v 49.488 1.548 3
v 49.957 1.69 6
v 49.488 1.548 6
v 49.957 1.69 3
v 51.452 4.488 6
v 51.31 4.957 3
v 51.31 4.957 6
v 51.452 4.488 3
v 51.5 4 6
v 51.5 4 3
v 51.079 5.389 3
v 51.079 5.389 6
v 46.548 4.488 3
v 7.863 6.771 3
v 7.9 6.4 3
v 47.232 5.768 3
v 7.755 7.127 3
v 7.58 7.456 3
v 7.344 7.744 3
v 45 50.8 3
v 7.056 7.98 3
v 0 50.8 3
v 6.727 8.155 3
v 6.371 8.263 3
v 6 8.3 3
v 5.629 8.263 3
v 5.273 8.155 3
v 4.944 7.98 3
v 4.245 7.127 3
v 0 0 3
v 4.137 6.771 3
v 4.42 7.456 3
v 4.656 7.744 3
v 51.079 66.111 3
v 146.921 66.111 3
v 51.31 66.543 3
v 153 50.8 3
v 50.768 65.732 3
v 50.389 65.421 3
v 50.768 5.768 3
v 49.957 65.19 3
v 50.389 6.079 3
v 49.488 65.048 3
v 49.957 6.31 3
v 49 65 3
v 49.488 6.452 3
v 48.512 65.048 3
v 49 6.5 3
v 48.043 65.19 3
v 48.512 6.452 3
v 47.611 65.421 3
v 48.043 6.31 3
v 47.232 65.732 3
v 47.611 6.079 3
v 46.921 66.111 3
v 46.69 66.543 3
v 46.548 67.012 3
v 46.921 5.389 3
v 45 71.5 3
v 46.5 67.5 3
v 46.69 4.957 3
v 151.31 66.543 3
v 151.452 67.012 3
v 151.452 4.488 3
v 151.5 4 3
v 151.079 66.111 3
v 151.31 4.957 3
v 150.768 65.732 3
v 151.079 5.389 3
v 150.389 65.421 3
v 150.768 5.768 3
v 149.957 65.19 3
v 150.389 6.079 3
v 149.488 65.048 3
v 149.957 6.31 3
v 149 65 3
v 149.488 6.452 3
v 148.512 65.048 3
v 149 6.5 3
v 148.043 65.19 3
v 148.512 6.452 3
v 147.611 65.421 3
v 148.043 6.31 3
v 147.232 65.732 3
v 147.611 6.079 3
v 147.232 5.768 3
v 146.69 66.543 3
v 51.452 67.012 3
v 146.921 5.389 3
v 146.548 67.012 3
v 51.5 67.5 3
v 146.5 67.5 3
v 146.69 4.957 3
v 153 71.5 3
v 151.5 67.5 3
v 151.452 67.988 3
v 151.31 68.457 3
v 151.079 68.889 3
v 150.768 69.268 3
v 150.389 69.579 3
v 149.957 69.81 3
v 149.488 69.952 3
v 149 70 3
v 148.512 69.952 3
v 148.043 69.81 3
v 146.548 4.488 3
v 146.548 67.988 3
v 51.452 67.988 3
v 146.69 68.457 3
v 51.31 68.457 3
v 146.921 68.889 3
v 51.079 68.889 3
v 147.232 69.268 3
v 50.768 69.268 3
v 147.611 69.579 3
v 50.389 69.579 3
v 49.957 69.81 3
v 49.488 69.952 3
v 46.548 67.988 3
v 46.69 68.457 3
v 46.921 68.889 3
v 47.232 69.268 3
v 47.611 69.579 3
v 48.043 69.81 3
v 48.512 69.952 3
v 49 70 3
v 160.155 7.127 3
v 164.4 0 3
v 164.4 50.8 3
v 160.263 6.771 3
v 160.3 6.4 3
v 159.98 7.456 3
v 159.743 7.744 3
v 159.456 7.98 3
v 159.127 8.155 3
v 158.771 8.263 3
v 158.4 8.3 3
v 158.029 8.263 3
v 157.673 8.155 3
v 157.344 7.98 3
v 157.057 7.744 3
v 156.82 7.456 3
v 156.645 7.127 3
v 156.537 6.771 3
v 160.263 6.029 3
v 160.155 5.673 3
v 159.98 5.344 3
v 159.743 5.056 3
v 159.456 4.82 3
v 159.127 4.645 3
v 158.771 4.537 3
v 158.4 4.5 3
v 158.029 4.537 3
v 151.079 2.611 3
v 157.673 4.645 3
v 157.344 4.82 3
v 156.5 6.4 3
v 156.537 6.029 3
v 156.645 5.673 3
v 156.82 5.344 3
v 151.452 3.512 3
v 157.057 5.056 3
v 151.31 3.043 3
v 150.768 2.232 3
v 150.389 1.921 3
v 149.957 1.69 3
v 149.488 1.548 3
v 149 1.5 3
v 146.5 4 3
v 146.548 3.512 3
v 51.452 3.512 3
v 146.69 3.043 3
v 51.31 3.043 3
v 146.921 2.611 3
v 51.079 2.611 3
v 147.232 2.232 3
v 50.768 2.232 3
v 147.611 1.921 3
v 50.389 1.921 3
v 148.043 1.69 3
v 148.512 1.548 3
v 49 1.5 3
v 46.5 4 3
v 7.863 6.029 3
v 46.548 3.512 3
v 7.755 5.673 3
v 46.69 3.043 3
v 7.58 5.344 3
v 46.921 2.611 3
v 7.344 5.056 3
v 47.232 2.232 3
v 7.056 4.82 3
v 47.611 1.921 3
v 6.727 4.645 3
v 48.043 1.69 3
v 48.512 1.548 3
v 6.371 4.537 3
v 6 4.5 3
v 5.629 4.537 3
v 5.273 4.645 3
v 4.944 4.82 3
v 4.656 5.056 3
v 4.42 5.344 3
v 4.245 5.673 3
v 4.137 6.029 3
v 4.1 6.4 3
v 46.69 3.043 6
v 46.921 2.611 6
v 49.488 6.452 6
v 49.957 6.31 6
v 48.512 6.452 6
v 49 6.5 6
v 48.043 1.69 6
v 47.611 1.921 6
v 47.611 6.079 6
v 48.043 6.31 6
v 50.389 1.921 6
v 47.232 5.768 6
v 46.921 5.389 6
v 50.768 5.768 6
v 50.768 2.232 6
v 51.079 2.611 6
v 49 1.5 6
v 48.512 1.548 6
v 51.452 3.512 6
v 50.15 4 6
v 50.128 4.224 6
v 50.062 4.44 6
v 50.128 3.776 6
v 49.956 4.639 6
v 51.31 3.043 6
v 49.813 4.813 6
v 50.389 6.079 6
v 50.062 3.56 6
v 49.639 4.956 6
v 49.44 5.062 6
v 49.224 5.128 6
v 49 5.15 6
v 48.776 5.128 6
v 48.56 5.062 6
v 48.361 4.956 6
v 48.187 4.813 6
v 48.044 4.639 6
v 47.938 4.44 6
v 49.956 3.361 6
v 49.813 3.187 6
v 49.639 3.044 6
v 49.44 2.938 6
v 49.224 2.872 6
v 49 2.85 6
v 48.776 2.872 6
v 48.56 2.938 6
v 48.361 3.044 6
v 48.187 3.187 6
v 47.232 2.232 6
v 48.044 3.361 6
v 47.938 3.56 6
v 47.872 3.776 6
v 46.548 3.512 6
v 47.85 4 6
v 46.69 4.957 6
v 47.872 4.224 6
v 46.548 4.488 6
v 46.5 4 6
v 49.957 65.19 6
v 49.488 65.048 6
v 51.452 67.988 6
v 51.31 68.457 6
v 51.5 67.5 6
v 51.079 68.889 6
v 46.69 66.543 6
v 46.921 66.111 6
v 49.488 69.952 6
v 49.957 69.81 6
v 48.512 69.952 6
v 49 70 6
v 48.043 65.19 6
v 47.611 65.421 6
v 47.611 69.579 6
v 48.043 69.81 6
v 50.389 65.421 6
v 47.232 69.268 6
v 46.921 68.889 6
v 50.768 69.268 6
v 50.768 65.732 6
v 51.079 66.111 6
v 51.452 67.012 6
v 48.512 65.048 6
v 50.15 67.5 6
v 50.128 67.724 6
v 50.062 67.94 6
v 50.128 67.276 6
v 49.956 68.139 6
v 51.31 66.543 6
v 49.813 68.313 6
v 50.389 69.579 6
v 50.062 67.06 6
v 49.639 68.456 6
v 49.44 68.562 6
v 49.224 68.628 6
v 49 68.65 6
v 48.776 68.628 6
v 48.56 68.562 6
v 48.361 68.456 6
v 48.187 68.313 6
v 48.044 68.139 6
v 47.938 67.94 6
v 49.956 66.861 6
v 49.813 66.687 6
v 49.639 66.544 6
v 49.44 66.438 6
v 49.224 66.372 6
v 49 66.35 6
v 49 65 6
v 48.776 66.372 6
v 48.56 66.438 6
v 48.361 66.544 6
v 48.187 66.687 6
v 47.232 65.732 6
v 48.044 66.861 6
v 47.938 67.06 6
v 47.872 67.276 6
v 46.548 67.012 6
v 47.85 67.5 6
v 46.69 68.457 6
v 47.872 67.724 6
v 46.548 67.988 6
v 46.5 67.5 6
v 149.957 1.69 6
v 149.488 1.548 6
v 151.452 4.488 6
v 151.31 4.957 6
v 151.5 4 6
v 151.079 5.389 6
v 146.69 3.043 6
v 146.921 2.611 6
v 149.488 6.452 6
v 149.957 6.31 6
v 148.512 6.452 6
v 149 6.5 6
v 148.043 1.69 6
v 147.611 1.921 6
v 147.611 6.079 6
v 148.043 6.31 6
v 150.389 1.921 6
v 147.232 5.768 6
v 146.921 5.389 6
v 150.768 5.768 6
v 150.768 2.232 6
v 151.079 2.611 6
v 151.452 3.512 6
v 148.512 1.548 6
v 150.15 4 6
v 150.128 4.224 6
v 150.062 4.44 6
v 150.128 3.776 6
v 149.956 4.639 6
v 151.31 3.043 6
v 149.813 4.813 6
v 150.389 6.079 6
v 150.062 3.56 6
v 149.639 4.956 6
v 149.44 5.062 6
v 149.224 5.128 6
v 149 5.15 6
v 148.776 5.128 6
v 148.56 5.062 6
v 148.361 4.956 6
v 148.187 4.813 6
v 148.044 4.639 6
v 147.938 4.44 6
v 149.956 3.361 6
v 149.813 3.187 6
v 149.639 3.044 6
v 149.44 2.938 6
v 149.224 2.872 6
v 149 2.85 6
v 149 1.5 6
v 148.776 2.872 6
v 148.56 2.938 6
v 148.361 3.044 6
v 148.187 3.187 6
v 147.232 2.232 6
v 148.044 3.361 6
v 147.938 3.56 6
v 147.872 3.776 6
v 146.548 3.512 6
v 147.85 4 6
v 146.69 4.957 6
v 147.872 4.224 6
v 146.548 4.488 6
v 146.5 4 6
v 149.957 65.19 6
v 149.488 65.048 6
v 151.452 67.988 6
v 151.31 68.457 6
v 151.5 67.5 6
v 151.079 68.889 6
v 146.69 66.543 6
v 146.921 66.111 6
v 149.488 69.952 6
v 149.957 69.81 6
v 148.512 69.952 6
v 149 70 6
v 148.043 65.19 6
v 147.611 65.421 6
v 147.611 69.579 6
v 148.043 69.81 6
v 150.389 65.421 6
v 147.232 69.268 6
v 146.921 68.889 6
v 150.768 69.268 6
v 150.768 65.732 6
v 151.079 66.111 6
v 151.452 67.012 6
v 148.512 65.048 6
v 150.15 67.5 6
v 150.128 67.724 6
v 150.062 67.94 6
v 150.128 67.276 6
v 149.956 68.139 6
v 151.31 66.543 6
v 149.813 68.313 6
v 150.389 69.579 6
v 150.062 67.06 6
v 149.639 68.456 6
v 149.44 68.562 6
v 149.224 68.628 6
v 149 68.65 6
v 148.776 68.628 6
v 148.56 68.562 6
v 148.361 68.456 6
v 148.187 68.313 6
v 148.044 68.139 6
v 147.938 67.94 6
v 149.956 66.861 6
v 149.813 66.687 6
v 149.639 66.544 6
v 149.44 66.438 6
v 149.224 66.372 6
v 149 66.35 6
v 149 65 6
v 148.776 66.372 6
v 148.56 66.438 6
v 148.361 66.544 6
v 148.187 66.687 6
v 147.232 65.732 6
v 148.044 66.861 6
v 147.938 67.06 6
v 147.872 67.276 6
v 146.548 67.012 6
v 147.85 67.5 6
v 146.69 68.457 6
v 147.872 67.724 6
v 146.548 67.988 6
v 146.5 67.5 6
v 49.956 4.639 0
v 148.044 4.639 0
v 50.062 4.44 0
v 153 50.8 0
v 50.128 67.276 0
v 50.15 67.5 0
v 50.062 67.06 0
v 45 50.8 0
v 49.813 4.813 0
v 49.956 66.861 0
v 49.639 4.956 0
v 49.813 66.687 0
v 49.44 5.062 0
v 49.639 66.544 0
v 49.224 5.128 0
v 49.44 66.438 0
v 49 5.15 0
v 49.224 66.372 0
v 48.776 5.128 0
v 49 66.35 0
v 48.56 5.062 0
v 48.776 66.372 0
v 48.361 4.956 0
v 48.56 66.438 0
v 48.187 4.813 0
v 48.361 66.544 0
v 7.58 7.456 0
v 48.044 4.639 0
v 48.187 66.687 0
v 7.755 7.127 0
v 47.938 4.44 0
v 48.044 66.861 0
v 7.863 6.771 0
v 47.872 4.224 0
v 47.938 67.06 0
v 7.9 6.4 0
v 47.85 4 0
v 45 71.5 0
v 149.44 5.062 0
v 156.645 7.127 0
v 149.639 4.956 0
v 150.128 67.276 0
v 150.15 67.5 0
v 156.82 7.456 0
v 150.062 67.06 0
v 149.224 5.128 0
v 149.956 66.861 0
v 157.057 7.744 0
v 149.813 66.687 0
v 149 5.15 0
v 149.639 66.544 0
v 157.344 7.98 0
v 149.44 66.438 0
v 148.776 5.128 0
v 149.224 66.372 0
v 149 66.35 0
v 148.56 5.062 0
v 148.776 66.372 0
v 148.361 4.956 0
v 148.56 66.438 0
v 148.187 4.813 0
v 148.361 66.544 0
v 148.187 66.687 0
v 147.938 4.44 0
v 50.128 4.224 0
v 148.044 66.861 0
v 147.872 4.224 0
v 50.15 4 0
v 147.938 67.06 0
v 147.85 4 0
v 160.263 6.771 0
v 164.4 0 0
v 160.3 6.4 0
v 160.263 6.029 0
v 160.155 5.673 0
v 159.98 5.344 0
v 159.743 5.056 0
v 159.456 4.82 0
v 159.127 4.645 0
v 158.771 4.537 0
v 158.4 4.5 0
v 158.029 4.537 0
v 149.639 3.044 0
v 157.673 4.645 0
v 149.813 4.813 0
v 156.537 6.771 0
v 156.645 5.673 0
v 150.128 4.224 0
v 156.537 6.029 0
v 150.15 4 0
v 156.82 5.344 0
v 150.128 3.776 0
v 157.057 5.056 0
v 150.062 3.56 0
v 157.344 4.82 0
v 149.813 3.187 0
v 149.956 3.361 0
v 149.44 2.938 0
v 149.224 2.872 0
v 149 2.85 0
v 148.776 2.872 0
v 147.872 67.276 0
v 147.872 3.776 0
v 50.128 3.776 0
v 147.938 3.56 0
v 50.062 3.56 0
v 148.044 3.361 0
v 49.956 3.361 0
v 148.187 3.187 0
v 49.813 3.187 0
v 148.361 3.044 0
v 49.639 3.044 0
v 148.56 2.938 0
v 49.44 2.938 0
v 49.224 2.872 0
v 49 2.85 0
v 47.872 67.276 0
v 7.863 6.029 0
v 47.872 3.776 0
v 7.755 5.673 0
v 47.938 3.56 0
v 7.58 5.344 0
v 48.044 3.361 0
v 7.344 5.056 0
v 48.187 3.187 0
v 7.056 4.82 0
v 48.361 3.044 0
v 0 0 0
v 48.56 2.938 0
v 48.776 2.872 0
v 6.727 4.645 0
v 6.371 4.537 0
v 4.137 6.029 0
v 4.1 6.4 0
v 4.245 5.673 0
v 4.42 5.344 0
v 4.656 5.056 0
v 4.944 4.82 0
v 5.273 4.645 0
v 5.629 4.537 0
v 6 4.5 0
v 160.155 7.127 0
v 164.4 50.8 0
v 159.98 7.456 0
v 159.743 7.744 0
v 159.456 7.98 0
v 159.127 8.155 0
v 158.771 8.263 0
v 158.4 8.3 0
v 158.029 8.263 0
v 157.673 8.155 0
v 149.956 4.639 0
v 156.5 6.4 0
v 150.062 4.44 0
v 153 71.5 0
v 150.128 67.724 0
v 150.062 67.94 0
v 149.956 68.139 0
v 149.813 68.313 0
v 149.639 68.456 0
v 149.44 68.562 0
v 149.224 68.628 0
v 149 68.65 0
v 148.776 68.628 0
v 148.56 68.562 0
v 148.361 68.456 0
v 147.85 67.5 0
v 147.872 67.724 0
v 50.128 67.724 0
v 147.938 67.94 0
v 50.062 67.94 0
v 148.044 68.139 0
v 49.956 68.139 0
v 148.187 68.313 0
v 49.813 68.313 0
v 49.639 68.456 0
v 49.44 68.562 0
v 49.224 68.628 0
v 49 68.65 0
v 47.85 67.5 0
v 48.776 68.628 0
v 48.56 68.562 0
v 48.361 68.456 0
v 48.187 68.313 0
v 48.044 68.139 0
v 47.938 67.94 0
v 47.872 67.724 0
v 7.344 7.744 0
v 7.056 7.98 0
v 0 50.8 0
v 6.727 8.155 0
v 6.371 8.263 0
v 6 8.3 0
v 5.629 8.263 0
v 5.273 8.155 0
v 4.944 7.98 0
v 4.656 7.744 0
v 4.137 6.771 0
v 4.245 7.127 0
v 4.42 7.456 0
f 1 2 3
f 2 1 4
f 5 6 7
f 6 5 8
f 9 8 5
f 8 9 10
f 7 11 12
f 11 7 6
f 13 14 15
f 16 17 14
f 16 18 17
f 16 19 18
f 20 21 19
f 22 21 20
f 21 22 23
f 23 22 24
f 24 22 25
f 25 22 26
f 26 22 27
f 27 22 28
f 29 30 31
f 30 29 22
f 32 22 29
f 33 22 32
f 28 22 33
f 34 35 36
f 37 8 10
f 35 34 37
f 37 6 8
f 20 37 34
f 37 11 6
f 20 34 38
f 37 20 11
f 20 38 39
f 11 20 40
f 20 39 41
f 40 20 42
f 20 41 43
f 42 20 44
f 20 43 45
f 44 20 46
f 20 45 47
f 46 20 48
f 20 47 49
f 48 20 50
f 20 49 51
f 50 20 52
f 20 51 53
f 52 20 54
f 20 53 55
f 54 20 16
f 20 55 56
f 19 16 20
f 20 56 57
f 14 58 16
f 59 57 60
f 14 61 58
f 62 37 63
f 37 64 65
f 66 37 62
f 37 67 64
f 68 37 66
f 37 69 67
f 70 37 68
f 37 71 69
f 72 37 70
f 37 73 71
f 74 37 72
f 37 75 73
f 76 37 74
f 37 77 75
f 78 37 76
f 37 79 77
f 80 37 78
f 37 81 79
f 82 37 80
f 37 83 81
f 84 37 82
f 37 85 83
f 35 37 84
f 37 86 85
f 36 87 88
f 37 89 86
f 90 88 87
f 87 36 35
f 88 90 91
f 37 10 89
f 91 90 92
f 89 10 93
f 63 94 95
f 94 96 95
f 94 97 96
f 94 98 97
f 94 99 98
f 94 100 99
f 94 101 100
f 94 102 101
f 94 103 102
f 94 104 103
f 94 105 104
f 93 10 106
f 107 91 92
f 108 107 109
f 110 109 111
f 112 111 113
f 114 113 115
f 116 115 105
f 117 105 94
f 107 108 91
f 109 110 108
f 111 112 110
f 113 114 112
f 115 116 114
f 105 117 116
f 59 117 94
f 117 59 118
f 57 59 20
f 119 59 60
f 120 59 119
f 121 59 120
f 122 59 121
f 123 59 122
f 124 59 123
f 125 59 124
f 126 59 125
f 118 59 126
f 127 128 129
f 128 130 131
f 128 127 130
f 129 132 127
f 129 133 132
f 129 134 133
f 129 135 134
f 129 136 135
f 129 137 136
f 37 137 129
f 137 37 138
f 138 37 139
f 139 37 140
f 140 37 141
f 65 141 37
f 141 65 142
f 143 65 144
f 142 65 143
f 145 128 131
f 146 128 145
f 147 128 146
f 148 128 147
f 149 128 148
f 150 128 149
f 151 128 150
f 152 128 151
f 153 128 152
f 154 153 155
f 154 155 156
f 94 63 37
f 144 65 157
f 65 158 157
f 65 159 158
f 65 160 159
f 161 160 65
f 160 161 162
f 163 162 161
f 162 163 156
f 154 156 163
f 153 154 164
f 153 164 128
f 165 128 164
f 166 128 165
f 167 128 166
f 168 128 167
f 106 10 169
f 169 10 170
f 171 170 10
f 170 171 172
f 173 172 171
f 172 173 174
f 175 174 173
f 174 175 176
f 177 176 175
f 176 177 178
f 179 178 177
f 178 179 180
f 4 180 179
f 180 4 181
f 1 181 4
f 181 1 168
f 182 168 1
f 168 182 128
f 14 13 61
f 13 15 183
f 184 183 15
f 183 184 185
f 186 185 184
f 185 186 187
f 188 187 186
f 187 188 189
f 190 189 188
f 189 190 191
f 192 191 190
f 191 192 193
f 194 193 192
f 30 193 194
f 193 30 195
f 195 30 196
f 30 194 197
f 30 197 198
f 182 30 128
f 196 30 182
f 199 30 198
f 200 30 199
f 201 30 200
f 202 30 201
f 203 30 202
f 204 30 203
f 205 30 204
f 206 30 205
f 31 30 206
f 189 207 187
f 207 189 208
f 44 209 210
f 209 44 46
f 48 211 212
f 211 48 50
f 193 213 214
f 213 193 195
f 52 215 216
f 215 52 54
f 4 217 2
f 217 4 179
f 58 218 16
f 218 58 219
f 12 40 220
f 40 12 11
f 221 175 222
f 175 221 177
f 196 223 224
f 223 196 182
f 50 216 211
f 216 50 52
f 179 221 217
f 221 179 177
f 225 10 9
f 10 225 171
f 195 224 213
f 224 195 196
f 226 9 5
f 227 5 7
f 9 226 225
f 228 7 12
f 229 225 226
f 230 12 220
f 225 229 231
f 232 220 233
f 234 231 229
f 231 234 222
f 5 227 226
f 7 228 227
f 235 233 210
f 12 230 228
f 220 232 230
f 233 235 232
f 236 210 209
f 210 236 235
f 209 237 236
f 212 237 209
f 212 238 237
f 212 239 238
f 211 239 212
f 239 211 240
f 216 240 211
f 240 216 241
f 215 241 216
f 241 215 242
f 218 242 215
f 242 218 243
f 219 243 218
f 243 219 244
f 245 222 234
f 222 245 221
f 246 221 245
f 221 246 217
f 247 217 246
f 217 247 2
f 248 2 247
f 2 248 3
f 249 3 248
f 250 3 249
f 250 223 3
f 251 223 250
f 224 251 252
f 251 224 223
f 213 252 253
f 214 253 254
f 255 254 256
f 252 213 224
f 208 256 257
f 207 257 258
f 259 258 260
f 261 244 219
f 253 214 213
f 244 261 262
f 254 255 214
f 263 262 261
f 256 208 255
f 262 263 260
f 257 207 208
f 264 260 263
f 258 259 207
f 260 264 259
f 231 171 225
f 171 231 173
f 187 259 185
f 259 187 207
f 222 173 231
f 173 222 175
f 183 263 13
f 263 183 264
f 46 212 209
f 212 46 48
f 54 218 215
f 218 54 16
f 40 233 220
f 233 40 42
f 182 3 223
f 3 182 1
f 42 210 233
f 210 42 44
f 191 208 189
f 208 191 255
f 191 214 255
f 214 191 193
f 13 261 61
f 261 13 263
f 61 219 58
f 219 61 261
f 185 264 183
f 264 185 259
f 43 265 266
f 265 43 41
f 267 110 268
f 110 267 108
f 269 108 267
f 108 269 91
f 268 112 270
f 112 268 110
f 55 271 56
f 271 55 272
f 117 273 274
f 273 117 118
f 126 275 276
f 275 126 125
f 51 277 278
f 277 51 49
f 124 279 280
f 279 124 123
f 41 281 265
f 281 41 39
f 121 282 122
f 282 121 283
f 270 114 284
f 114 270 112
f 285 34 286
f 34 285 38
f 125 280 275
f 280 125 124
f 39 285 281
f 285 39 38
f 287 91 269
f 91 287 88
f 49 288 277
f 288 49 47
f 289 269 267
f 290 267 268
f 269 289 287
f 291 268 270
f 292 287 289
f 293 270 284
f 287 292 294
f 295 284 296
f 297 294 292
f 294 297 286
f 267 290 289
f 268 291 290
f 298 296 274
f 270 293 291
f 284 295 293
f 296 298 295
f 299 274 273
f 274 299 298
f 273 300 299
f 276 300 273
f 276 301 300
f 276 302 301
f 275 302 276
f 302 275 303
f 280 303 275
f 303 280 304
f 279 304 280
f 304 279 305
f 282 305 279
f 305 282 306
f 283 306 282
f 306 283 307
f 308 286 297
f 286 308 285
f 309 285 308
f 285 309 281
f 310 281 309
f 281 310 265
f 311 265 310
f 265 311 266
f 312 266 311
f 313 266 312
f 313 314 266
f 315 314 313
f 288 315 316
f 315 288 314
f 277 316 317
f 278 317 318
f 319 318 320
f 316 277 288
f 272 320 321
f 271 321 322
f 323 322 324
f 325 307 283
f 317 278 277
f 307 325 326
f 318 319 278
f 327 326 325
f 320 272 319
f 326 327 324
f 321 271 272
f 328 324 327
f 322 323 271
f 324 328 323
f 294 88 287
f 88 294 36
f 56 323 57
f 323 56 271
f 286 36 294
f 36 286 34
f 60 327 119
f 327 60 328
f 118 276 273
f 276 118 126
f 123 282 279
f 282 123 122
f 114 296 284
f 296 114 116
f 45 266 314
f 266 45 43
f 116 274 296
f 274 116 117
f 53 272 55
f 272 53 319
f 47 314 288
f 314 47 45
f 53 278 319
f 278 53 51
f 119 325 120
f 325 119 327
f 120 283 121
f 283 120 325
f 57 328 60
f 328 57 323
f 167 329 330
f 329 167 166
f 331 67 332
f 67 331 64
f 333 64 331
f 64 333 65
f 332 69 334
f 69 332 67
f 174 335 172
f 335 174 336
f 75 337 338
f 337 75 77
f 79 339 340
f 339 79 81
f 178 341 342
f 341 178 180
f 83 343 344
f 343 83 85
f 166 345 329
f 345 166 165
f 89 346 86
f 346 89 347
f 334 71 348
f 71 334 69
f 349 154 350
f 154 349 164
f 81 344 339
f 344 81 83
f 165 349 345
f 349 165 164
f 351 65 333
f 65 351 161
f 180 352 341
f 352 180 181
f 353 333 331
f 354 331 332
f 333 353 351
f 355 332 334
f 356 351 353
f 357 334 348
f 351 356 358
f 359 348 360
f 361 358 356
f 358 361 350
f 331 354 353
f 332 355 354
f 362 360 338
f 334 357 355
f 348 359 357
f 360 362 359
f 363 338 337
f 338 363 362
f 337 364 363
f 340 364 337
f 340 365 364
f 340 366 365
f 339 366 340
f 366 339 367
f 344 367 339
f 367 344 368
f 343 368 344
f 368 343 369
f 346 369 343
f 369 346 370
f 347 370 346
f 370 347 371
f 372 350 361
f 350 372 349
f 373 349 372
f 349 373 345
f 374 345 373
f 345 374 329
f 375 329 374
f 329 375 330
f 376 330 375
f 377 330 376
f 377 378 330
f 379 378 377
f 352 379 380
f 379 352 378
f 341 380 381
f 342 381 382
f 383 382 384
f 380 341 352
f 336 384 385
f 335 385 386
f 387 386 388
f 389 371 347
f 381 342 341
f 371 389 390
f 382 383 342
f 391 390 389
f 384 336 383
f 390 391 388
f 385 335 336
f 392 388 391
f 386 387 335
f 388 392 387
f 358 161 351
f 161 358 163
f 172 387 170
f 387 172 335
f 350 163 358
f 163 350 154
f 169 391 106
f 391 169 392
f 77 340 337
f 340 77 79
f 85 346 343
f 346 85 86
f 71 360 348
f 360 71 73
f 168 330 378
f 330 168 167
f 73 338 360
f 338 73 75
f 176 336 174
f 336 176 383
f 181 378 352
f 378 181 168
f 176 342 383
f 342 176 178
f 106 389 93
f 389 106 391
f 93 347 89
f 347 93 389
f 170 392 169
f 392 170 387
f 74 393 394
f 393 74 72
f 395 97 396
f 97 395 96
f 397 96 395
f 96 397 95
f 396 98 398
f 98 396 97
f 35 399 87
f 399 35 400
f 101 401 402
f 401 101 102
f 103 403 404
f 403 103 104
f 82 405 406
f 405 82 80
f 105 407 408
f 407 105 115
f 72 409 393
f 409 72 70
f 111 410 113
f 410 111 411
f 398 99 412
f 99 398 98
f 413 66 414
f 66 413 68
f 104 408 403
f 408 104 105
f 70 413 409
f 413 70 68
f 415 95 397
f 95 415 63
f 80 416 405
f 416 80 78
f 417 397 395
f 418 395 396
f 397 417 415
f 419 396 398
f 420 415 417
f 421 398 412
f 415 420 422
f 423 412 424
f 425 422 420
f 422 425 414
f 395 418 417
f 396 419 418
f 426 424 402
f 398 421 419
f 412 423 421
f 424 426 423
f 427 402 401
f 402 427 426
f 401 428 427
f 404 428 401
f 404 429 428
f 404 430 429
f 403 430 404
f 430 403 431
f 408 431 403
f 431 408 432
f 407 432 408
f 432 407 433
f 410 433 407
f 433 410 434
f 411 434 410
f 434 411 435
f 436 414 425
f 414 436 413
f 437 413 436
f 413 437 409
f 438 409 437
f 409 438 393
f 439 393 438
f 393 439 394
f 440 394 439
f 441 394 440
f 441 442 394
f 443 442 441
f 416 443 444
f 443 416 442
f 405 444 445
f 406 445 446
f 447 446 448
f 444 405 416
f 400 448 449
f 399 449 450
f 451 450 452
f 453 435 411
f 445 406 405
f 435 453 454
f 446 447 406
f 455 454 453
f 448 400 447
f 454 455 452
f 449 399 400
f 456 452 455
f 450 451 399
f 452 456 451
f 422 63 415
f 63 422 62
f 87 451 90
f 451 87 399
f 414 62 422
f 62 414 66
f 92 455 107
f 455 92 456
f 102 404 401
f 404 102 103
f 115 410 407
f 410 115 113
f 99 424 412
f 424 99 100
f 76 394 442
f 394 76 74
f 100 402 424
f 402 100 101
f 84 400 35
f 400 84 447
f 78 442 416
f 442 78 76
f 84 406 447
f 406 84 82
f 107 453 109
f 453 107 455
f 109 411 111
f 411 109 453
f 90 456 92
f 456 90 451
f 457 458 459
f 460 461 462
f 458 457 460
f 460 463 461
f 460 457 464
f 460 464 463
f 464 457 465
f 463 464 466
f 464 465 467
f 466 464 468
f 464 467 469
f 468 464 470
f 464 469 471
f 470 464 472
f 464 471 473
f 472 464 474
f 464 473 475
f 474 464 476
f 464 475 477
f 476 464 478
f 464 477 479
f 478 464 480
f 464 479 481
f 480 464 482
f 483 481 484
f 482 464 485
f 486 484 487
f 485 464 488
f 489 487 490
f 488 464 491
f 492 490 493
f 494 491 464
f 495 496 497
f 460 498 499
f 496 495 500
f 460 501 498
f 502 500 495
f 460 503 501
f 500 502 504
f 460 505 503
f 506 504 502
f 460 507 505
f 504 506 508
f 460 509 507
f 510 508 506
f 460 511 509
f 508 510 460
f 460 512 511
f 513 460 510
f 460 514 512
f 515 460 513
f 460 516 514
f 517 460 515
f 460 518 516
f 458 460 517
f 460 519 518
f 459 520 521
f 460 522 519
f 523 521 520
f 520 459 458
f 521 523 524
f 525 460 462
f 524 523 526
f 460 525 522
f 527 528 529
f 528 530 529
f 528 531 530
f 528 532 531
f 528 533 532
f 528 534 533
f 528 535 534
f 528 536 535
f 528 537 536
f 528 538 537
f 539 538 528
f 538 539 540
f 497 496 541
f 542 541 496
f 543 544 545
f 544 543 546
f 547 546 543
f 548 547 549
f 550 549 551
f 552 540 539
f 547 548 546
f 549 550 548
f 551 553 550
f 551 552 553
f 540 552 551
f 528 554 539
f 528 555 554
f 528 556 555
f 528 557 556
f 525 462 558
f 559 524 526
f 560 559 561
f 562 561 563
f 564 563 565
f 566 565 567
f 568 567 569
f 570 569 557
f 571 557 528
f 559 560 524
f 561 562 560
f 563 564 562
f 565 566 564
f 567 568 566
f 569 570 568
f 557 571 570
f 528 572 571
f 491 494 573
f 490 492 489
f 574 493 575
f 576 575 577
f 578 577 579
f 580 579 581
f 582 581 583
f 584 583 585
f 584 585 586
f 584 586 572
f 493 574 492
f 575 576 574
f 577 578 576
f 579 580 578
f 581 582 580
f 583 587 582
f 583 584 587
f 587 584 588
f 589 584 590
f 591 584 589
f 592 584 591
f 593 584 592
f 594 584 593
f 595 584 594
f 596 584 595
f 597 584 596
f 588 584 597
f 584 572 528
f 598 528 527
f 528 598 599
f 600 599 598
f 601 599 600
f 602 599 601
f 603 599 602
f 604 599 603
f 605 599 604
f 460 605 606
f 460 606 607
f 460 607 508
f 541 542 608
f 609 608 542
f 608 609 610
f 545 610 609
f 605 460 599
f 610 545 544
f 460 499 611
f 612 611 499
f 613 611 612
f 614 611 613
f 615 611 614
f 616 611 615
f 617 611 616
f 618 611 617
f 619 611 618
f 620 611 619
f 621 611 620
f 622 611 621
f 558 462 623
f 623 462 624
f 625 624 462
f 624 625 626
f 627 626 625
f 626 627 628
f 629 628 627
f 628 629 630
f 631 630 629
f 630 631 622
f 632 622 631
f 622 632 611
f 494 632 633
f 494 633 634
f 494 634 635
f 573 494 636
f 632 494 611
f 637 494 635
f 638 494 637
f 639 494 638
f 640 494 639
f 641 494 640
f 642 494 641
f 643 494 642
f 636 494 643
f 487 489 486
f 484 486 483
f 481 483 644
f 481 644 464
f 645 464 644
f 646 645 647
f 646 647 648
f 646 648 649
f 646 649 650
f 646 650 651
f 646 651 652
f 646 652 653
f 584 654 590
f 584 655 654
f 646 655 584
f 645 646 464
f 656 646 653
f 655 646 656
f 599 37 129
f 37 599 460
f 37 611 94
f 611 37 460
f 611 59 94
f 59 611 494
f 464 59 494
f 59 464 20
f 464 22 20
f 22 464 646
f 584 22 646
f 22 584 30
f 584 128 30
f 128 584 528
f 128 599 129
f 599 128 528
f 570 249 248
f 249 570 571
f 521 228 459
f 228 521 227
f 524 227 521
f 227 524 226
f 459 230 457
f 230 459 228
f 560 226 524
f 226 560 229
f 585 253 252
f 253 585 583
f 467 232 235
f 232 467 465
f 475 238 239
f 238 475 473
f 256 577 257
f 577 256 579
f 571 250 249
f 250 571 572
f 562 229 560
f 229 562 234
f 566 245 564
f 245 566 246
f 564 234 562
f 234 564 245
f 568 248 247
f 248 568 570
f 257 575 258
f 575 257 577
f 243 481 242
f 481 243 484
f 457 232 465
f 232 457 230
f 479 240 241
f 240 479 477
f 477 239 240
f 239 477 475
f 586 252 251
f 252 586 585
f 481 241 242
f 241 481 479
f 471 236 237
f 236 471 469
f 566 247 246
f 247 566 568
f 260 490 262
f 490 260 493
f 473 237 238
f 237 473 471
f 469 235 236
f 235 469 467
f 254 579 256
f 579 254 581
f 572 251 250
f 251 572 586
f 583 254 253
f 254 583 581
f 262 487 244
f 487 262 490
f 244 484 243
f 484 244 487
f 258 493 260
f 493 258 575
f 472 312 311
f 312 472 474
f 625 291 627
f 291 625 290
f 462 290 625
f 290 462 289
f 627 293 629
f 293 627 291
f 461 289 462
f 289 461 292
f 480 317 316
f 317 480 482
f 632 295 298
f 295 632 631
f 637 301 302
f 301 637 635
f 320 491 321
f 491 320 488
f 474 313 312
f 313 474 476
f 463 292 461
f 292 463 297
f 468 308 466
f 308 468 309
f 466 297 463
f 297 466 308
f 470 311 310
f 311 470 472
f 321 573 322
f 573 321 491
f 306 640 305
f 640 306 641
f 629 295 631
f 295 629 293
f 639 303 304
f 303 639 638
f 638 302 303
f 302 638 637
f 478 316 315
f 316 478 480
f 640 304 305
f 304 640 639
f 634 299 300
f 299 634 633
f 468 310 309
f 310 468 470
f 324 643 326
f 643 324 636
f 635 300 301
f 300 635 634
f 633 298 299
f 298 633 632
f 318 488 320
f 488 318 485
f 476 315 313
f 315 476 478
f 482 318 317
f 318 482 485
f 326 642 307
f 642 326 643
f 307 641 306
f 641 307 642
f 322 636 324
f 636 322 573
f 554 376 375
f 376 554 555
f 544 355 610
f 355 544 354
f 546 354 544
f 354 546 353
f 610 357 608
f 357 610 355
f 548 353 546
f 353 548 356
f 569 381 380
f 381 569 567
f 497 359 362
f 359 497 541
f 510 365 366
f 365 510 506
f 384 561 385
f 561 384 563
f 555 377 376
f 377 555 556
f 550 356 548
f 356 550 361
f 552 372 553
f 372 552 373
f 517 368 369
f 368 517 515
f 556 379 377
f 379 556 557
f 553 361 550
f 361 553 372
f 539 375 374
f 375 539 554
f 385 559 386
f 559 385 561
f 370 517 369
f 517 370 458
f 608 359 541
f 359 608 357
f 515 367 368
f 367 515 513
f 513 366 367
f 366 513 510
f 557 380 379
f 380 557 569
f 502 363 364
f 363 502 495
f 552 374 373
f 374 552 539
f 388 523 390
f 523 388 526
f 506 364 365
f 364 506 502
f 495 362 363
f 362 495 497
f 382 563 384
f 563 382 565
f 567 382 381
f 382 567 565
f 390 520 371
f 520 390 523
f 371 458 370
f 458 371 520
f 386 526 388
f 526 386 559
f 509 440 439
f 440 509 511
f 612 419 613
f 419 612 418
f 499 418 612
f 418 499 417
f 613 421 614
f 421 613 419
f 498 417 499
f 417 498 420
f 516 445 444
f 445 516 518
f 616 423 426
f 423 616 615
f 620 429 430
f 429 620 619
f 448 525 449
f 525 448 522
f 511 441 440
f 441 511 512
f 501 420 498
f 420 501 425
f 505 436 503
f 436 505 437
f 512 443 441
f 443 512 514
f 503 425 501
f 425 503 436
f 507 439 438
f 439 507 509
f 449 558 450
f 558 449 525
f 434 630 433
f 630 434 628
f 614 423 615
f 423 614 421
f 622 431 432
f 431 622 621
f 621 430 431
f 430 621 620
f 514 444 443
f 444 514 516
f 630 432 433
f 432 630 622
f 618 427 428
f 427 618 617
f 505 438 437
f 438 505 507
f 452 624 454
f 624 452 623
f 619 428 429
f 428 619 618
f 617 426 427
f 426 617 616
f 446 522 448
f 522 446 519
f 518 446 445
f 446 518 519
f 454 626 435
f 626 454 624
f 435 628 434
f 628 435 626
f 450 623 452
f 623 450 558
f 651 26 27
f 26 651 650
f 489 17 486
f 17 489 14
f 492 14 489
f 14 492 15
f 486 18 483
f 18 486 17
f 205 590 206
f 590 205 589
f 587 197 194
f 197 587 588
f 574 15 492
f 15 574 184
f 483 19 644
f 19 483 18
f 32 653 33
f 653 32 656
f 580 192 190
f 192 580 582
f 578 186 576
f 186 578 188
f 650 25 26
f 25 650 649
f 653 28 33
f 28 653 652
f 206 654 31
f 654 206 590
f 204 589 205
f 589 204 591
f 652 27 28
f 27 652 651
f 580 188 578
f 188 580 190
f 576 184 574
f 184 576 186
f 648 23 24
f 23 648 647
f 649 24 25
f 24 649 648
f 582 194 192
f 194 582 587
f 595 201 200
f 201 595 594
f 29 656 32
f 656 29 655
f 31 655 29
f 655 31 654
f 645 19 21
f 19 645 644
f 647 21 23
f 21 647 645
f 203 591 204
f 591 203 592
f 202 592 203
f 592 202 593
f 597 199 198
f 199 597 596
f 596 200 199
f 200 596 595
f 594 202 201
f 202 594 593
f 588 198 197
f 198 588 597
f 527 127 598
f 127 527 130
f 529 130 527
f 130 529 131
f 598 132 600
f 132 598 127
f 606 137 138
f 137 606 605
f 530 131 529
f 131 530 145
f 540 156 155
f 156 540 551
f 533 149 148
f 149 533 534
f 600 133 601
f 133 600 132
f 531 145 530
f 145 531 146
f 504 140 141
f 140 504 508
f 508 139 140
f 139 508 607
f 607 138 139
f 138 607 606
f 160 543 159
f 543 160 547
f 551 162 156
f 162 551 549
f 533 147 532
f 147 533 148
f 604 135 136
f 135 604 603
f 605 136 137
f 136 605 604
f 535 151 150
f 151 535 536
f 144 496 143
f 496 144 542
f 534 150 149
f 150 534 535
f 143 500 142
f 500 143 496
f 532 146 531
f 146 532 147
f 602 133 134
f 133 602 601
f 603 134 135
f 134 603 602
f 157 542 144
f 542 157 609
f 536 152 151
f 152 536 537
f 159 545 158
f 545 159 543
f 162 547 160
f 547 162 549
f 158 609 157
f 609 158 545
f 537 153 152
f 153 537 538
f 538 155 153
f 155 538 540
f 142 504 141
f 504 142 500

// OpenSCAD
// TritonECU — PSU pad
// A flat plate, not a bracket. Stepped outline: a full-width body with a raised
// centre section. The module bolts onto it through four Ø5 x 3 standoffs; two
// Ø3.5 holes at the bottom corners fix the pad down. Built from the hand
// drawing of 2026-09-20.
//
//   render one part at a time:  part = "pad"
//
//     |<-45->|<------ 108 ------>|<-11.4->|
//            +-------------------+           ---
//            |  I             I  |            |     <- raised section
//     +------+                   +--------+   |   71.5
//     |                                   |  50.8
//     |  o   I             I           o  |   |     <- o = Ø3.5, I = standoff
//     +-----------------------------------+  ---
//     |<-------------- 164.4 ------------>|
//
//   standoffs: 100 across x 63.5 along, centred in the RAISED SECTION and in
//   the 71.5. Ø3.5 pair: 152.4 apart, 6.4 up from the bottom edge.

part = "pad";

/* Tessellation. Chord error is r*(1-cos(180/n)); a 3.5 mm hole at fn 32 is off
   by 0.0042 mm, orders below what the printer resolves. */
$fn     = 32;
hole_fn = 32;

/* ---------------------------------------------------------------------------
   FROM THE DRAWING — every number here is dimensioned on the sketch
   --------------------------------------------------------------------------- */
pad_w    = 164.4;  // overall width
pad_h    =  71.5;  // overall height, bottom edge to the top of the raised part
shoulder =  50.8;  // height of the full-width body — where the step happens
step_l   =  45.0;  // left edge to the raised section
step_w   = 108.0;  // width of the raised section
step_r_g =  11.4;  // raised section to the right edge  (45 + 108 + 11.4 = 164.4)

fix_dx   = 152.4;  // the Ø3.5 pair, centre to centre
fix_y    =   6.4;  // their centres, up from the bottom edge
fix_d    =   3.5;

pat_dx   = 100.0;  // the four standoff holes, across
pat_dy   =  63.5;  // the four standoff holes, along
pat_d    =   2.0;  // "2 mm hole" in the centre of each standoff

/* ---------------------------------------------------------------------------
   NOT ON THE DRAWING — decisions, change them freely
   --------------------------------------------------------------------------- */

/* Thickness. The drawing gives none. 3 mm, the same as every other plate in
   this repo. A pad is not a bracket: it carries the module in COMPRESSION into
   whatever it is screwed to, so the 3 mm is about handling and screw seats
   rather than bending. */
t         = 3.0;

/* Printed bores come out undersize by 0.2-0.4 mm on diameter. Both hole
   families are modelled OVERSIZE by this so they finish on nominal:
   2.0 -> 2.30 and 3.5 -> 3.80. Set to 0 to model nominal and drill. */
hole_comp = 0.30;

/* Standoffs, same as hardware/l-bracket and hardware/psu-platform: 3 mm of
   LIFT, Ø5 so a Ø2.3 bore keeps a 1.35 mm wall. */
standoff   = true;
standoff_h = 3.0;
standoff_d = 5.0;

/* Fillet in the two re-entrant corners of the step. OFF (0) because the drawing
   shows square corners and a pad is not a loaded part. A few mm here is free
   insurance if it ever gets flexed: those corners are the only stress risers in
   the outline. */
step_fill = 0.0;

/* Hole pattern origin. The sketch centres the 100 x 63.5 pattern in the RAISED
   SECTION across, and in the 71.5 along — measured off the drawing, the pattern
   centre lands within 1 mm of the raised section's centre and nowhere near the
   plate's. Set these two if the real module says otherwise. */
pat_x0    = step_l + (step_w - pat_dx) / 2;   // 49.00
pat_y0    = (pad_h - pat_dy) / 2;             // 4.00

/* ---------------------------------------------------------------------------
   Geometry
   --------------------------------------------------------------------------- */
pat_r  = (pat_d + hole_comp) / 2;
fix_r  = (fix_d + hole_comp) / 2;
step_x = step_l + step_w;                     // 153.00, right edge of the step
fix_x0 = (pad_w - fix_dx) / 2;                // 6.00

module outline() {
    pts = [[0, 0], [pad_w, 0], [pad_w, shoulder], [step_x, shoulder],
           [step_x, pad_h], [step_l, pad_h], [step_l, shoulder], [0, shoulder]];
    if (step_fill > 0)
        // dilate then erode: rounds the CONCAVE corners, leaves the rest sharp
        offset(r = -step_fill) offset(r = step_fill) polygon(pts);
    else
        polygon(pts);
}

module pad() {
    difference() {
        union() {
            linear_extrude(t) outline();
            if (standoff)
                for (i = [0, 1], j = [0, 1])
                    translate([pat_x0 + i * pat_dx, pat_y0 + j * pat_dy, t])
                        cylinder(h = standoff_h, d = standoff_d, $fn = hole_fn);
        }
        // four 2 mm bores, through plate and standoff together
        for (i = [0, 1], j = [0, 1])
            translate([pat_x0 + i * pat_dx, pat_y0 + j * pat_dy, -1])
                cylinder(h = t + (standoff ? standoff_h : 0) + 2, r = pat_r,
                         $fn = hole_fn);
        // the Ø3.5 pair
        for (i = [0, 1])
            translate([fix_x0 + i * fix_dx, fix_y, -1])
                cylinder(h = t + 2, r = fix_r, $fn = hole_fn);
    }
}

if (part == "pad") pad();

/* ---------------------------------------------------------------------------
   Checks — these print on every render, so they follow the parameters rather
   than the README
   --------------------------------------------------------------------------- */
echo(str("outline              ", pad_w, " x ", pad_h, " x ", t, " mm"));
echo(str("  body (full width)  0 .. ", shoulder, ",  raised section ", shoulder,
         " .. ", pad_h, " over x ", step_l, " .. ", step_x));
echo(str("  WIDTH CHECK        ", step_l, " + ", step_w, " + ", step_r_g, " = ",
         step_l + step_w + step_r_g, "  vs overall ", pad_w,
         (abs(step_l + step_w + step_r_g - pad_w) < 0.001)
           ? "  (exact — this is what fixes the reading)"
           : "  <-- DOES NOT CLOSE, one of the four is wrong"));
echo(str("standoff holes  dia  ", pat_d + hole_comp, " (", pat_d, " + ",
         hole_comp, ")   pattern ", pat_dx, " x ", pat_dy));
echo(str("  centres  x         ", pat_x0, " and ", pat_x0 + pat_dx));
echo(str("  centres  y         ", pat_y0, " and ", pat_y0 + pat_dy));
echo(str("  top row sits ", pad_h - (pat_y0 + pat_dy),
         " below the top edge, bottom row ", pat_y0, " above the bottom"));
echo(str("  in the raised section, each side  ",
         pat_x0 - step_l, " mm to the step edge"));
echo(str("Ø", fix_d, " pair  dia ", fix_d + hole_comp, "   centres x ", fix_x0,
         " and ", fix_x0 + fix_dx, ",  y ", fix_y));
echo(str("  plate round them   ", fix_x0 - fix_r, " mm to the side edge, ",
         fix_y - fix_r, " mm to the bottom"));
if (standoff) {
    echo(str("standoffs            4 x ", standoff_d, " dia x ", standoff_h,
             " tall, on the TOP face"));
    echo(str("  wall around bore   ", (standoff_d - (pat_d + hole_comp)) / 2,
             " mm",
             ((standoff_d - (pat_d + hole_comp)) / 2 < 0.8)
               ? "  <-- UNDER 2 extrusion widths, raise standoff_d" : "  (ok)"));
    echo(str("  bottom row boss to the bottom edge  ",
             pat_y0 - standoff_d / 2, " mm",
             (pat_y0 - standoff_d / 2 < 0) ? "  <-- OVERHANGS" : ""));
    echo(str("  top row boss to the top edge        ",
             pad_h - (pat_y0 + pat_dy) - standoff_d / 2, " mm",
             (pad_h - (pat_y0 + pat_dy) - standoff_d / 2 < 0)
               ? "  <-- OVERHANGS" : ""));
    echo(str("  boss to the step's side edges       ",
             pat_x0 - step_l - standoff_d / 2, " mm",
             (pat_x0 - step_l - standoff_d / 2 < 0) ? "  <-- OVERHANGS" : ""));
    echo(str("  thread stack       ", t + standoff_h, " mm — ",
             (t + standoff_h) / pat_d, " diameters of M2 if tapped"));
    echo(str("  overall height     ", t + standoff_h, " mm to the tips"));
}
echo(str("bed footprint          ", pad_w, " x ", pad_h,
         "  — flat, every bore vertical"));
